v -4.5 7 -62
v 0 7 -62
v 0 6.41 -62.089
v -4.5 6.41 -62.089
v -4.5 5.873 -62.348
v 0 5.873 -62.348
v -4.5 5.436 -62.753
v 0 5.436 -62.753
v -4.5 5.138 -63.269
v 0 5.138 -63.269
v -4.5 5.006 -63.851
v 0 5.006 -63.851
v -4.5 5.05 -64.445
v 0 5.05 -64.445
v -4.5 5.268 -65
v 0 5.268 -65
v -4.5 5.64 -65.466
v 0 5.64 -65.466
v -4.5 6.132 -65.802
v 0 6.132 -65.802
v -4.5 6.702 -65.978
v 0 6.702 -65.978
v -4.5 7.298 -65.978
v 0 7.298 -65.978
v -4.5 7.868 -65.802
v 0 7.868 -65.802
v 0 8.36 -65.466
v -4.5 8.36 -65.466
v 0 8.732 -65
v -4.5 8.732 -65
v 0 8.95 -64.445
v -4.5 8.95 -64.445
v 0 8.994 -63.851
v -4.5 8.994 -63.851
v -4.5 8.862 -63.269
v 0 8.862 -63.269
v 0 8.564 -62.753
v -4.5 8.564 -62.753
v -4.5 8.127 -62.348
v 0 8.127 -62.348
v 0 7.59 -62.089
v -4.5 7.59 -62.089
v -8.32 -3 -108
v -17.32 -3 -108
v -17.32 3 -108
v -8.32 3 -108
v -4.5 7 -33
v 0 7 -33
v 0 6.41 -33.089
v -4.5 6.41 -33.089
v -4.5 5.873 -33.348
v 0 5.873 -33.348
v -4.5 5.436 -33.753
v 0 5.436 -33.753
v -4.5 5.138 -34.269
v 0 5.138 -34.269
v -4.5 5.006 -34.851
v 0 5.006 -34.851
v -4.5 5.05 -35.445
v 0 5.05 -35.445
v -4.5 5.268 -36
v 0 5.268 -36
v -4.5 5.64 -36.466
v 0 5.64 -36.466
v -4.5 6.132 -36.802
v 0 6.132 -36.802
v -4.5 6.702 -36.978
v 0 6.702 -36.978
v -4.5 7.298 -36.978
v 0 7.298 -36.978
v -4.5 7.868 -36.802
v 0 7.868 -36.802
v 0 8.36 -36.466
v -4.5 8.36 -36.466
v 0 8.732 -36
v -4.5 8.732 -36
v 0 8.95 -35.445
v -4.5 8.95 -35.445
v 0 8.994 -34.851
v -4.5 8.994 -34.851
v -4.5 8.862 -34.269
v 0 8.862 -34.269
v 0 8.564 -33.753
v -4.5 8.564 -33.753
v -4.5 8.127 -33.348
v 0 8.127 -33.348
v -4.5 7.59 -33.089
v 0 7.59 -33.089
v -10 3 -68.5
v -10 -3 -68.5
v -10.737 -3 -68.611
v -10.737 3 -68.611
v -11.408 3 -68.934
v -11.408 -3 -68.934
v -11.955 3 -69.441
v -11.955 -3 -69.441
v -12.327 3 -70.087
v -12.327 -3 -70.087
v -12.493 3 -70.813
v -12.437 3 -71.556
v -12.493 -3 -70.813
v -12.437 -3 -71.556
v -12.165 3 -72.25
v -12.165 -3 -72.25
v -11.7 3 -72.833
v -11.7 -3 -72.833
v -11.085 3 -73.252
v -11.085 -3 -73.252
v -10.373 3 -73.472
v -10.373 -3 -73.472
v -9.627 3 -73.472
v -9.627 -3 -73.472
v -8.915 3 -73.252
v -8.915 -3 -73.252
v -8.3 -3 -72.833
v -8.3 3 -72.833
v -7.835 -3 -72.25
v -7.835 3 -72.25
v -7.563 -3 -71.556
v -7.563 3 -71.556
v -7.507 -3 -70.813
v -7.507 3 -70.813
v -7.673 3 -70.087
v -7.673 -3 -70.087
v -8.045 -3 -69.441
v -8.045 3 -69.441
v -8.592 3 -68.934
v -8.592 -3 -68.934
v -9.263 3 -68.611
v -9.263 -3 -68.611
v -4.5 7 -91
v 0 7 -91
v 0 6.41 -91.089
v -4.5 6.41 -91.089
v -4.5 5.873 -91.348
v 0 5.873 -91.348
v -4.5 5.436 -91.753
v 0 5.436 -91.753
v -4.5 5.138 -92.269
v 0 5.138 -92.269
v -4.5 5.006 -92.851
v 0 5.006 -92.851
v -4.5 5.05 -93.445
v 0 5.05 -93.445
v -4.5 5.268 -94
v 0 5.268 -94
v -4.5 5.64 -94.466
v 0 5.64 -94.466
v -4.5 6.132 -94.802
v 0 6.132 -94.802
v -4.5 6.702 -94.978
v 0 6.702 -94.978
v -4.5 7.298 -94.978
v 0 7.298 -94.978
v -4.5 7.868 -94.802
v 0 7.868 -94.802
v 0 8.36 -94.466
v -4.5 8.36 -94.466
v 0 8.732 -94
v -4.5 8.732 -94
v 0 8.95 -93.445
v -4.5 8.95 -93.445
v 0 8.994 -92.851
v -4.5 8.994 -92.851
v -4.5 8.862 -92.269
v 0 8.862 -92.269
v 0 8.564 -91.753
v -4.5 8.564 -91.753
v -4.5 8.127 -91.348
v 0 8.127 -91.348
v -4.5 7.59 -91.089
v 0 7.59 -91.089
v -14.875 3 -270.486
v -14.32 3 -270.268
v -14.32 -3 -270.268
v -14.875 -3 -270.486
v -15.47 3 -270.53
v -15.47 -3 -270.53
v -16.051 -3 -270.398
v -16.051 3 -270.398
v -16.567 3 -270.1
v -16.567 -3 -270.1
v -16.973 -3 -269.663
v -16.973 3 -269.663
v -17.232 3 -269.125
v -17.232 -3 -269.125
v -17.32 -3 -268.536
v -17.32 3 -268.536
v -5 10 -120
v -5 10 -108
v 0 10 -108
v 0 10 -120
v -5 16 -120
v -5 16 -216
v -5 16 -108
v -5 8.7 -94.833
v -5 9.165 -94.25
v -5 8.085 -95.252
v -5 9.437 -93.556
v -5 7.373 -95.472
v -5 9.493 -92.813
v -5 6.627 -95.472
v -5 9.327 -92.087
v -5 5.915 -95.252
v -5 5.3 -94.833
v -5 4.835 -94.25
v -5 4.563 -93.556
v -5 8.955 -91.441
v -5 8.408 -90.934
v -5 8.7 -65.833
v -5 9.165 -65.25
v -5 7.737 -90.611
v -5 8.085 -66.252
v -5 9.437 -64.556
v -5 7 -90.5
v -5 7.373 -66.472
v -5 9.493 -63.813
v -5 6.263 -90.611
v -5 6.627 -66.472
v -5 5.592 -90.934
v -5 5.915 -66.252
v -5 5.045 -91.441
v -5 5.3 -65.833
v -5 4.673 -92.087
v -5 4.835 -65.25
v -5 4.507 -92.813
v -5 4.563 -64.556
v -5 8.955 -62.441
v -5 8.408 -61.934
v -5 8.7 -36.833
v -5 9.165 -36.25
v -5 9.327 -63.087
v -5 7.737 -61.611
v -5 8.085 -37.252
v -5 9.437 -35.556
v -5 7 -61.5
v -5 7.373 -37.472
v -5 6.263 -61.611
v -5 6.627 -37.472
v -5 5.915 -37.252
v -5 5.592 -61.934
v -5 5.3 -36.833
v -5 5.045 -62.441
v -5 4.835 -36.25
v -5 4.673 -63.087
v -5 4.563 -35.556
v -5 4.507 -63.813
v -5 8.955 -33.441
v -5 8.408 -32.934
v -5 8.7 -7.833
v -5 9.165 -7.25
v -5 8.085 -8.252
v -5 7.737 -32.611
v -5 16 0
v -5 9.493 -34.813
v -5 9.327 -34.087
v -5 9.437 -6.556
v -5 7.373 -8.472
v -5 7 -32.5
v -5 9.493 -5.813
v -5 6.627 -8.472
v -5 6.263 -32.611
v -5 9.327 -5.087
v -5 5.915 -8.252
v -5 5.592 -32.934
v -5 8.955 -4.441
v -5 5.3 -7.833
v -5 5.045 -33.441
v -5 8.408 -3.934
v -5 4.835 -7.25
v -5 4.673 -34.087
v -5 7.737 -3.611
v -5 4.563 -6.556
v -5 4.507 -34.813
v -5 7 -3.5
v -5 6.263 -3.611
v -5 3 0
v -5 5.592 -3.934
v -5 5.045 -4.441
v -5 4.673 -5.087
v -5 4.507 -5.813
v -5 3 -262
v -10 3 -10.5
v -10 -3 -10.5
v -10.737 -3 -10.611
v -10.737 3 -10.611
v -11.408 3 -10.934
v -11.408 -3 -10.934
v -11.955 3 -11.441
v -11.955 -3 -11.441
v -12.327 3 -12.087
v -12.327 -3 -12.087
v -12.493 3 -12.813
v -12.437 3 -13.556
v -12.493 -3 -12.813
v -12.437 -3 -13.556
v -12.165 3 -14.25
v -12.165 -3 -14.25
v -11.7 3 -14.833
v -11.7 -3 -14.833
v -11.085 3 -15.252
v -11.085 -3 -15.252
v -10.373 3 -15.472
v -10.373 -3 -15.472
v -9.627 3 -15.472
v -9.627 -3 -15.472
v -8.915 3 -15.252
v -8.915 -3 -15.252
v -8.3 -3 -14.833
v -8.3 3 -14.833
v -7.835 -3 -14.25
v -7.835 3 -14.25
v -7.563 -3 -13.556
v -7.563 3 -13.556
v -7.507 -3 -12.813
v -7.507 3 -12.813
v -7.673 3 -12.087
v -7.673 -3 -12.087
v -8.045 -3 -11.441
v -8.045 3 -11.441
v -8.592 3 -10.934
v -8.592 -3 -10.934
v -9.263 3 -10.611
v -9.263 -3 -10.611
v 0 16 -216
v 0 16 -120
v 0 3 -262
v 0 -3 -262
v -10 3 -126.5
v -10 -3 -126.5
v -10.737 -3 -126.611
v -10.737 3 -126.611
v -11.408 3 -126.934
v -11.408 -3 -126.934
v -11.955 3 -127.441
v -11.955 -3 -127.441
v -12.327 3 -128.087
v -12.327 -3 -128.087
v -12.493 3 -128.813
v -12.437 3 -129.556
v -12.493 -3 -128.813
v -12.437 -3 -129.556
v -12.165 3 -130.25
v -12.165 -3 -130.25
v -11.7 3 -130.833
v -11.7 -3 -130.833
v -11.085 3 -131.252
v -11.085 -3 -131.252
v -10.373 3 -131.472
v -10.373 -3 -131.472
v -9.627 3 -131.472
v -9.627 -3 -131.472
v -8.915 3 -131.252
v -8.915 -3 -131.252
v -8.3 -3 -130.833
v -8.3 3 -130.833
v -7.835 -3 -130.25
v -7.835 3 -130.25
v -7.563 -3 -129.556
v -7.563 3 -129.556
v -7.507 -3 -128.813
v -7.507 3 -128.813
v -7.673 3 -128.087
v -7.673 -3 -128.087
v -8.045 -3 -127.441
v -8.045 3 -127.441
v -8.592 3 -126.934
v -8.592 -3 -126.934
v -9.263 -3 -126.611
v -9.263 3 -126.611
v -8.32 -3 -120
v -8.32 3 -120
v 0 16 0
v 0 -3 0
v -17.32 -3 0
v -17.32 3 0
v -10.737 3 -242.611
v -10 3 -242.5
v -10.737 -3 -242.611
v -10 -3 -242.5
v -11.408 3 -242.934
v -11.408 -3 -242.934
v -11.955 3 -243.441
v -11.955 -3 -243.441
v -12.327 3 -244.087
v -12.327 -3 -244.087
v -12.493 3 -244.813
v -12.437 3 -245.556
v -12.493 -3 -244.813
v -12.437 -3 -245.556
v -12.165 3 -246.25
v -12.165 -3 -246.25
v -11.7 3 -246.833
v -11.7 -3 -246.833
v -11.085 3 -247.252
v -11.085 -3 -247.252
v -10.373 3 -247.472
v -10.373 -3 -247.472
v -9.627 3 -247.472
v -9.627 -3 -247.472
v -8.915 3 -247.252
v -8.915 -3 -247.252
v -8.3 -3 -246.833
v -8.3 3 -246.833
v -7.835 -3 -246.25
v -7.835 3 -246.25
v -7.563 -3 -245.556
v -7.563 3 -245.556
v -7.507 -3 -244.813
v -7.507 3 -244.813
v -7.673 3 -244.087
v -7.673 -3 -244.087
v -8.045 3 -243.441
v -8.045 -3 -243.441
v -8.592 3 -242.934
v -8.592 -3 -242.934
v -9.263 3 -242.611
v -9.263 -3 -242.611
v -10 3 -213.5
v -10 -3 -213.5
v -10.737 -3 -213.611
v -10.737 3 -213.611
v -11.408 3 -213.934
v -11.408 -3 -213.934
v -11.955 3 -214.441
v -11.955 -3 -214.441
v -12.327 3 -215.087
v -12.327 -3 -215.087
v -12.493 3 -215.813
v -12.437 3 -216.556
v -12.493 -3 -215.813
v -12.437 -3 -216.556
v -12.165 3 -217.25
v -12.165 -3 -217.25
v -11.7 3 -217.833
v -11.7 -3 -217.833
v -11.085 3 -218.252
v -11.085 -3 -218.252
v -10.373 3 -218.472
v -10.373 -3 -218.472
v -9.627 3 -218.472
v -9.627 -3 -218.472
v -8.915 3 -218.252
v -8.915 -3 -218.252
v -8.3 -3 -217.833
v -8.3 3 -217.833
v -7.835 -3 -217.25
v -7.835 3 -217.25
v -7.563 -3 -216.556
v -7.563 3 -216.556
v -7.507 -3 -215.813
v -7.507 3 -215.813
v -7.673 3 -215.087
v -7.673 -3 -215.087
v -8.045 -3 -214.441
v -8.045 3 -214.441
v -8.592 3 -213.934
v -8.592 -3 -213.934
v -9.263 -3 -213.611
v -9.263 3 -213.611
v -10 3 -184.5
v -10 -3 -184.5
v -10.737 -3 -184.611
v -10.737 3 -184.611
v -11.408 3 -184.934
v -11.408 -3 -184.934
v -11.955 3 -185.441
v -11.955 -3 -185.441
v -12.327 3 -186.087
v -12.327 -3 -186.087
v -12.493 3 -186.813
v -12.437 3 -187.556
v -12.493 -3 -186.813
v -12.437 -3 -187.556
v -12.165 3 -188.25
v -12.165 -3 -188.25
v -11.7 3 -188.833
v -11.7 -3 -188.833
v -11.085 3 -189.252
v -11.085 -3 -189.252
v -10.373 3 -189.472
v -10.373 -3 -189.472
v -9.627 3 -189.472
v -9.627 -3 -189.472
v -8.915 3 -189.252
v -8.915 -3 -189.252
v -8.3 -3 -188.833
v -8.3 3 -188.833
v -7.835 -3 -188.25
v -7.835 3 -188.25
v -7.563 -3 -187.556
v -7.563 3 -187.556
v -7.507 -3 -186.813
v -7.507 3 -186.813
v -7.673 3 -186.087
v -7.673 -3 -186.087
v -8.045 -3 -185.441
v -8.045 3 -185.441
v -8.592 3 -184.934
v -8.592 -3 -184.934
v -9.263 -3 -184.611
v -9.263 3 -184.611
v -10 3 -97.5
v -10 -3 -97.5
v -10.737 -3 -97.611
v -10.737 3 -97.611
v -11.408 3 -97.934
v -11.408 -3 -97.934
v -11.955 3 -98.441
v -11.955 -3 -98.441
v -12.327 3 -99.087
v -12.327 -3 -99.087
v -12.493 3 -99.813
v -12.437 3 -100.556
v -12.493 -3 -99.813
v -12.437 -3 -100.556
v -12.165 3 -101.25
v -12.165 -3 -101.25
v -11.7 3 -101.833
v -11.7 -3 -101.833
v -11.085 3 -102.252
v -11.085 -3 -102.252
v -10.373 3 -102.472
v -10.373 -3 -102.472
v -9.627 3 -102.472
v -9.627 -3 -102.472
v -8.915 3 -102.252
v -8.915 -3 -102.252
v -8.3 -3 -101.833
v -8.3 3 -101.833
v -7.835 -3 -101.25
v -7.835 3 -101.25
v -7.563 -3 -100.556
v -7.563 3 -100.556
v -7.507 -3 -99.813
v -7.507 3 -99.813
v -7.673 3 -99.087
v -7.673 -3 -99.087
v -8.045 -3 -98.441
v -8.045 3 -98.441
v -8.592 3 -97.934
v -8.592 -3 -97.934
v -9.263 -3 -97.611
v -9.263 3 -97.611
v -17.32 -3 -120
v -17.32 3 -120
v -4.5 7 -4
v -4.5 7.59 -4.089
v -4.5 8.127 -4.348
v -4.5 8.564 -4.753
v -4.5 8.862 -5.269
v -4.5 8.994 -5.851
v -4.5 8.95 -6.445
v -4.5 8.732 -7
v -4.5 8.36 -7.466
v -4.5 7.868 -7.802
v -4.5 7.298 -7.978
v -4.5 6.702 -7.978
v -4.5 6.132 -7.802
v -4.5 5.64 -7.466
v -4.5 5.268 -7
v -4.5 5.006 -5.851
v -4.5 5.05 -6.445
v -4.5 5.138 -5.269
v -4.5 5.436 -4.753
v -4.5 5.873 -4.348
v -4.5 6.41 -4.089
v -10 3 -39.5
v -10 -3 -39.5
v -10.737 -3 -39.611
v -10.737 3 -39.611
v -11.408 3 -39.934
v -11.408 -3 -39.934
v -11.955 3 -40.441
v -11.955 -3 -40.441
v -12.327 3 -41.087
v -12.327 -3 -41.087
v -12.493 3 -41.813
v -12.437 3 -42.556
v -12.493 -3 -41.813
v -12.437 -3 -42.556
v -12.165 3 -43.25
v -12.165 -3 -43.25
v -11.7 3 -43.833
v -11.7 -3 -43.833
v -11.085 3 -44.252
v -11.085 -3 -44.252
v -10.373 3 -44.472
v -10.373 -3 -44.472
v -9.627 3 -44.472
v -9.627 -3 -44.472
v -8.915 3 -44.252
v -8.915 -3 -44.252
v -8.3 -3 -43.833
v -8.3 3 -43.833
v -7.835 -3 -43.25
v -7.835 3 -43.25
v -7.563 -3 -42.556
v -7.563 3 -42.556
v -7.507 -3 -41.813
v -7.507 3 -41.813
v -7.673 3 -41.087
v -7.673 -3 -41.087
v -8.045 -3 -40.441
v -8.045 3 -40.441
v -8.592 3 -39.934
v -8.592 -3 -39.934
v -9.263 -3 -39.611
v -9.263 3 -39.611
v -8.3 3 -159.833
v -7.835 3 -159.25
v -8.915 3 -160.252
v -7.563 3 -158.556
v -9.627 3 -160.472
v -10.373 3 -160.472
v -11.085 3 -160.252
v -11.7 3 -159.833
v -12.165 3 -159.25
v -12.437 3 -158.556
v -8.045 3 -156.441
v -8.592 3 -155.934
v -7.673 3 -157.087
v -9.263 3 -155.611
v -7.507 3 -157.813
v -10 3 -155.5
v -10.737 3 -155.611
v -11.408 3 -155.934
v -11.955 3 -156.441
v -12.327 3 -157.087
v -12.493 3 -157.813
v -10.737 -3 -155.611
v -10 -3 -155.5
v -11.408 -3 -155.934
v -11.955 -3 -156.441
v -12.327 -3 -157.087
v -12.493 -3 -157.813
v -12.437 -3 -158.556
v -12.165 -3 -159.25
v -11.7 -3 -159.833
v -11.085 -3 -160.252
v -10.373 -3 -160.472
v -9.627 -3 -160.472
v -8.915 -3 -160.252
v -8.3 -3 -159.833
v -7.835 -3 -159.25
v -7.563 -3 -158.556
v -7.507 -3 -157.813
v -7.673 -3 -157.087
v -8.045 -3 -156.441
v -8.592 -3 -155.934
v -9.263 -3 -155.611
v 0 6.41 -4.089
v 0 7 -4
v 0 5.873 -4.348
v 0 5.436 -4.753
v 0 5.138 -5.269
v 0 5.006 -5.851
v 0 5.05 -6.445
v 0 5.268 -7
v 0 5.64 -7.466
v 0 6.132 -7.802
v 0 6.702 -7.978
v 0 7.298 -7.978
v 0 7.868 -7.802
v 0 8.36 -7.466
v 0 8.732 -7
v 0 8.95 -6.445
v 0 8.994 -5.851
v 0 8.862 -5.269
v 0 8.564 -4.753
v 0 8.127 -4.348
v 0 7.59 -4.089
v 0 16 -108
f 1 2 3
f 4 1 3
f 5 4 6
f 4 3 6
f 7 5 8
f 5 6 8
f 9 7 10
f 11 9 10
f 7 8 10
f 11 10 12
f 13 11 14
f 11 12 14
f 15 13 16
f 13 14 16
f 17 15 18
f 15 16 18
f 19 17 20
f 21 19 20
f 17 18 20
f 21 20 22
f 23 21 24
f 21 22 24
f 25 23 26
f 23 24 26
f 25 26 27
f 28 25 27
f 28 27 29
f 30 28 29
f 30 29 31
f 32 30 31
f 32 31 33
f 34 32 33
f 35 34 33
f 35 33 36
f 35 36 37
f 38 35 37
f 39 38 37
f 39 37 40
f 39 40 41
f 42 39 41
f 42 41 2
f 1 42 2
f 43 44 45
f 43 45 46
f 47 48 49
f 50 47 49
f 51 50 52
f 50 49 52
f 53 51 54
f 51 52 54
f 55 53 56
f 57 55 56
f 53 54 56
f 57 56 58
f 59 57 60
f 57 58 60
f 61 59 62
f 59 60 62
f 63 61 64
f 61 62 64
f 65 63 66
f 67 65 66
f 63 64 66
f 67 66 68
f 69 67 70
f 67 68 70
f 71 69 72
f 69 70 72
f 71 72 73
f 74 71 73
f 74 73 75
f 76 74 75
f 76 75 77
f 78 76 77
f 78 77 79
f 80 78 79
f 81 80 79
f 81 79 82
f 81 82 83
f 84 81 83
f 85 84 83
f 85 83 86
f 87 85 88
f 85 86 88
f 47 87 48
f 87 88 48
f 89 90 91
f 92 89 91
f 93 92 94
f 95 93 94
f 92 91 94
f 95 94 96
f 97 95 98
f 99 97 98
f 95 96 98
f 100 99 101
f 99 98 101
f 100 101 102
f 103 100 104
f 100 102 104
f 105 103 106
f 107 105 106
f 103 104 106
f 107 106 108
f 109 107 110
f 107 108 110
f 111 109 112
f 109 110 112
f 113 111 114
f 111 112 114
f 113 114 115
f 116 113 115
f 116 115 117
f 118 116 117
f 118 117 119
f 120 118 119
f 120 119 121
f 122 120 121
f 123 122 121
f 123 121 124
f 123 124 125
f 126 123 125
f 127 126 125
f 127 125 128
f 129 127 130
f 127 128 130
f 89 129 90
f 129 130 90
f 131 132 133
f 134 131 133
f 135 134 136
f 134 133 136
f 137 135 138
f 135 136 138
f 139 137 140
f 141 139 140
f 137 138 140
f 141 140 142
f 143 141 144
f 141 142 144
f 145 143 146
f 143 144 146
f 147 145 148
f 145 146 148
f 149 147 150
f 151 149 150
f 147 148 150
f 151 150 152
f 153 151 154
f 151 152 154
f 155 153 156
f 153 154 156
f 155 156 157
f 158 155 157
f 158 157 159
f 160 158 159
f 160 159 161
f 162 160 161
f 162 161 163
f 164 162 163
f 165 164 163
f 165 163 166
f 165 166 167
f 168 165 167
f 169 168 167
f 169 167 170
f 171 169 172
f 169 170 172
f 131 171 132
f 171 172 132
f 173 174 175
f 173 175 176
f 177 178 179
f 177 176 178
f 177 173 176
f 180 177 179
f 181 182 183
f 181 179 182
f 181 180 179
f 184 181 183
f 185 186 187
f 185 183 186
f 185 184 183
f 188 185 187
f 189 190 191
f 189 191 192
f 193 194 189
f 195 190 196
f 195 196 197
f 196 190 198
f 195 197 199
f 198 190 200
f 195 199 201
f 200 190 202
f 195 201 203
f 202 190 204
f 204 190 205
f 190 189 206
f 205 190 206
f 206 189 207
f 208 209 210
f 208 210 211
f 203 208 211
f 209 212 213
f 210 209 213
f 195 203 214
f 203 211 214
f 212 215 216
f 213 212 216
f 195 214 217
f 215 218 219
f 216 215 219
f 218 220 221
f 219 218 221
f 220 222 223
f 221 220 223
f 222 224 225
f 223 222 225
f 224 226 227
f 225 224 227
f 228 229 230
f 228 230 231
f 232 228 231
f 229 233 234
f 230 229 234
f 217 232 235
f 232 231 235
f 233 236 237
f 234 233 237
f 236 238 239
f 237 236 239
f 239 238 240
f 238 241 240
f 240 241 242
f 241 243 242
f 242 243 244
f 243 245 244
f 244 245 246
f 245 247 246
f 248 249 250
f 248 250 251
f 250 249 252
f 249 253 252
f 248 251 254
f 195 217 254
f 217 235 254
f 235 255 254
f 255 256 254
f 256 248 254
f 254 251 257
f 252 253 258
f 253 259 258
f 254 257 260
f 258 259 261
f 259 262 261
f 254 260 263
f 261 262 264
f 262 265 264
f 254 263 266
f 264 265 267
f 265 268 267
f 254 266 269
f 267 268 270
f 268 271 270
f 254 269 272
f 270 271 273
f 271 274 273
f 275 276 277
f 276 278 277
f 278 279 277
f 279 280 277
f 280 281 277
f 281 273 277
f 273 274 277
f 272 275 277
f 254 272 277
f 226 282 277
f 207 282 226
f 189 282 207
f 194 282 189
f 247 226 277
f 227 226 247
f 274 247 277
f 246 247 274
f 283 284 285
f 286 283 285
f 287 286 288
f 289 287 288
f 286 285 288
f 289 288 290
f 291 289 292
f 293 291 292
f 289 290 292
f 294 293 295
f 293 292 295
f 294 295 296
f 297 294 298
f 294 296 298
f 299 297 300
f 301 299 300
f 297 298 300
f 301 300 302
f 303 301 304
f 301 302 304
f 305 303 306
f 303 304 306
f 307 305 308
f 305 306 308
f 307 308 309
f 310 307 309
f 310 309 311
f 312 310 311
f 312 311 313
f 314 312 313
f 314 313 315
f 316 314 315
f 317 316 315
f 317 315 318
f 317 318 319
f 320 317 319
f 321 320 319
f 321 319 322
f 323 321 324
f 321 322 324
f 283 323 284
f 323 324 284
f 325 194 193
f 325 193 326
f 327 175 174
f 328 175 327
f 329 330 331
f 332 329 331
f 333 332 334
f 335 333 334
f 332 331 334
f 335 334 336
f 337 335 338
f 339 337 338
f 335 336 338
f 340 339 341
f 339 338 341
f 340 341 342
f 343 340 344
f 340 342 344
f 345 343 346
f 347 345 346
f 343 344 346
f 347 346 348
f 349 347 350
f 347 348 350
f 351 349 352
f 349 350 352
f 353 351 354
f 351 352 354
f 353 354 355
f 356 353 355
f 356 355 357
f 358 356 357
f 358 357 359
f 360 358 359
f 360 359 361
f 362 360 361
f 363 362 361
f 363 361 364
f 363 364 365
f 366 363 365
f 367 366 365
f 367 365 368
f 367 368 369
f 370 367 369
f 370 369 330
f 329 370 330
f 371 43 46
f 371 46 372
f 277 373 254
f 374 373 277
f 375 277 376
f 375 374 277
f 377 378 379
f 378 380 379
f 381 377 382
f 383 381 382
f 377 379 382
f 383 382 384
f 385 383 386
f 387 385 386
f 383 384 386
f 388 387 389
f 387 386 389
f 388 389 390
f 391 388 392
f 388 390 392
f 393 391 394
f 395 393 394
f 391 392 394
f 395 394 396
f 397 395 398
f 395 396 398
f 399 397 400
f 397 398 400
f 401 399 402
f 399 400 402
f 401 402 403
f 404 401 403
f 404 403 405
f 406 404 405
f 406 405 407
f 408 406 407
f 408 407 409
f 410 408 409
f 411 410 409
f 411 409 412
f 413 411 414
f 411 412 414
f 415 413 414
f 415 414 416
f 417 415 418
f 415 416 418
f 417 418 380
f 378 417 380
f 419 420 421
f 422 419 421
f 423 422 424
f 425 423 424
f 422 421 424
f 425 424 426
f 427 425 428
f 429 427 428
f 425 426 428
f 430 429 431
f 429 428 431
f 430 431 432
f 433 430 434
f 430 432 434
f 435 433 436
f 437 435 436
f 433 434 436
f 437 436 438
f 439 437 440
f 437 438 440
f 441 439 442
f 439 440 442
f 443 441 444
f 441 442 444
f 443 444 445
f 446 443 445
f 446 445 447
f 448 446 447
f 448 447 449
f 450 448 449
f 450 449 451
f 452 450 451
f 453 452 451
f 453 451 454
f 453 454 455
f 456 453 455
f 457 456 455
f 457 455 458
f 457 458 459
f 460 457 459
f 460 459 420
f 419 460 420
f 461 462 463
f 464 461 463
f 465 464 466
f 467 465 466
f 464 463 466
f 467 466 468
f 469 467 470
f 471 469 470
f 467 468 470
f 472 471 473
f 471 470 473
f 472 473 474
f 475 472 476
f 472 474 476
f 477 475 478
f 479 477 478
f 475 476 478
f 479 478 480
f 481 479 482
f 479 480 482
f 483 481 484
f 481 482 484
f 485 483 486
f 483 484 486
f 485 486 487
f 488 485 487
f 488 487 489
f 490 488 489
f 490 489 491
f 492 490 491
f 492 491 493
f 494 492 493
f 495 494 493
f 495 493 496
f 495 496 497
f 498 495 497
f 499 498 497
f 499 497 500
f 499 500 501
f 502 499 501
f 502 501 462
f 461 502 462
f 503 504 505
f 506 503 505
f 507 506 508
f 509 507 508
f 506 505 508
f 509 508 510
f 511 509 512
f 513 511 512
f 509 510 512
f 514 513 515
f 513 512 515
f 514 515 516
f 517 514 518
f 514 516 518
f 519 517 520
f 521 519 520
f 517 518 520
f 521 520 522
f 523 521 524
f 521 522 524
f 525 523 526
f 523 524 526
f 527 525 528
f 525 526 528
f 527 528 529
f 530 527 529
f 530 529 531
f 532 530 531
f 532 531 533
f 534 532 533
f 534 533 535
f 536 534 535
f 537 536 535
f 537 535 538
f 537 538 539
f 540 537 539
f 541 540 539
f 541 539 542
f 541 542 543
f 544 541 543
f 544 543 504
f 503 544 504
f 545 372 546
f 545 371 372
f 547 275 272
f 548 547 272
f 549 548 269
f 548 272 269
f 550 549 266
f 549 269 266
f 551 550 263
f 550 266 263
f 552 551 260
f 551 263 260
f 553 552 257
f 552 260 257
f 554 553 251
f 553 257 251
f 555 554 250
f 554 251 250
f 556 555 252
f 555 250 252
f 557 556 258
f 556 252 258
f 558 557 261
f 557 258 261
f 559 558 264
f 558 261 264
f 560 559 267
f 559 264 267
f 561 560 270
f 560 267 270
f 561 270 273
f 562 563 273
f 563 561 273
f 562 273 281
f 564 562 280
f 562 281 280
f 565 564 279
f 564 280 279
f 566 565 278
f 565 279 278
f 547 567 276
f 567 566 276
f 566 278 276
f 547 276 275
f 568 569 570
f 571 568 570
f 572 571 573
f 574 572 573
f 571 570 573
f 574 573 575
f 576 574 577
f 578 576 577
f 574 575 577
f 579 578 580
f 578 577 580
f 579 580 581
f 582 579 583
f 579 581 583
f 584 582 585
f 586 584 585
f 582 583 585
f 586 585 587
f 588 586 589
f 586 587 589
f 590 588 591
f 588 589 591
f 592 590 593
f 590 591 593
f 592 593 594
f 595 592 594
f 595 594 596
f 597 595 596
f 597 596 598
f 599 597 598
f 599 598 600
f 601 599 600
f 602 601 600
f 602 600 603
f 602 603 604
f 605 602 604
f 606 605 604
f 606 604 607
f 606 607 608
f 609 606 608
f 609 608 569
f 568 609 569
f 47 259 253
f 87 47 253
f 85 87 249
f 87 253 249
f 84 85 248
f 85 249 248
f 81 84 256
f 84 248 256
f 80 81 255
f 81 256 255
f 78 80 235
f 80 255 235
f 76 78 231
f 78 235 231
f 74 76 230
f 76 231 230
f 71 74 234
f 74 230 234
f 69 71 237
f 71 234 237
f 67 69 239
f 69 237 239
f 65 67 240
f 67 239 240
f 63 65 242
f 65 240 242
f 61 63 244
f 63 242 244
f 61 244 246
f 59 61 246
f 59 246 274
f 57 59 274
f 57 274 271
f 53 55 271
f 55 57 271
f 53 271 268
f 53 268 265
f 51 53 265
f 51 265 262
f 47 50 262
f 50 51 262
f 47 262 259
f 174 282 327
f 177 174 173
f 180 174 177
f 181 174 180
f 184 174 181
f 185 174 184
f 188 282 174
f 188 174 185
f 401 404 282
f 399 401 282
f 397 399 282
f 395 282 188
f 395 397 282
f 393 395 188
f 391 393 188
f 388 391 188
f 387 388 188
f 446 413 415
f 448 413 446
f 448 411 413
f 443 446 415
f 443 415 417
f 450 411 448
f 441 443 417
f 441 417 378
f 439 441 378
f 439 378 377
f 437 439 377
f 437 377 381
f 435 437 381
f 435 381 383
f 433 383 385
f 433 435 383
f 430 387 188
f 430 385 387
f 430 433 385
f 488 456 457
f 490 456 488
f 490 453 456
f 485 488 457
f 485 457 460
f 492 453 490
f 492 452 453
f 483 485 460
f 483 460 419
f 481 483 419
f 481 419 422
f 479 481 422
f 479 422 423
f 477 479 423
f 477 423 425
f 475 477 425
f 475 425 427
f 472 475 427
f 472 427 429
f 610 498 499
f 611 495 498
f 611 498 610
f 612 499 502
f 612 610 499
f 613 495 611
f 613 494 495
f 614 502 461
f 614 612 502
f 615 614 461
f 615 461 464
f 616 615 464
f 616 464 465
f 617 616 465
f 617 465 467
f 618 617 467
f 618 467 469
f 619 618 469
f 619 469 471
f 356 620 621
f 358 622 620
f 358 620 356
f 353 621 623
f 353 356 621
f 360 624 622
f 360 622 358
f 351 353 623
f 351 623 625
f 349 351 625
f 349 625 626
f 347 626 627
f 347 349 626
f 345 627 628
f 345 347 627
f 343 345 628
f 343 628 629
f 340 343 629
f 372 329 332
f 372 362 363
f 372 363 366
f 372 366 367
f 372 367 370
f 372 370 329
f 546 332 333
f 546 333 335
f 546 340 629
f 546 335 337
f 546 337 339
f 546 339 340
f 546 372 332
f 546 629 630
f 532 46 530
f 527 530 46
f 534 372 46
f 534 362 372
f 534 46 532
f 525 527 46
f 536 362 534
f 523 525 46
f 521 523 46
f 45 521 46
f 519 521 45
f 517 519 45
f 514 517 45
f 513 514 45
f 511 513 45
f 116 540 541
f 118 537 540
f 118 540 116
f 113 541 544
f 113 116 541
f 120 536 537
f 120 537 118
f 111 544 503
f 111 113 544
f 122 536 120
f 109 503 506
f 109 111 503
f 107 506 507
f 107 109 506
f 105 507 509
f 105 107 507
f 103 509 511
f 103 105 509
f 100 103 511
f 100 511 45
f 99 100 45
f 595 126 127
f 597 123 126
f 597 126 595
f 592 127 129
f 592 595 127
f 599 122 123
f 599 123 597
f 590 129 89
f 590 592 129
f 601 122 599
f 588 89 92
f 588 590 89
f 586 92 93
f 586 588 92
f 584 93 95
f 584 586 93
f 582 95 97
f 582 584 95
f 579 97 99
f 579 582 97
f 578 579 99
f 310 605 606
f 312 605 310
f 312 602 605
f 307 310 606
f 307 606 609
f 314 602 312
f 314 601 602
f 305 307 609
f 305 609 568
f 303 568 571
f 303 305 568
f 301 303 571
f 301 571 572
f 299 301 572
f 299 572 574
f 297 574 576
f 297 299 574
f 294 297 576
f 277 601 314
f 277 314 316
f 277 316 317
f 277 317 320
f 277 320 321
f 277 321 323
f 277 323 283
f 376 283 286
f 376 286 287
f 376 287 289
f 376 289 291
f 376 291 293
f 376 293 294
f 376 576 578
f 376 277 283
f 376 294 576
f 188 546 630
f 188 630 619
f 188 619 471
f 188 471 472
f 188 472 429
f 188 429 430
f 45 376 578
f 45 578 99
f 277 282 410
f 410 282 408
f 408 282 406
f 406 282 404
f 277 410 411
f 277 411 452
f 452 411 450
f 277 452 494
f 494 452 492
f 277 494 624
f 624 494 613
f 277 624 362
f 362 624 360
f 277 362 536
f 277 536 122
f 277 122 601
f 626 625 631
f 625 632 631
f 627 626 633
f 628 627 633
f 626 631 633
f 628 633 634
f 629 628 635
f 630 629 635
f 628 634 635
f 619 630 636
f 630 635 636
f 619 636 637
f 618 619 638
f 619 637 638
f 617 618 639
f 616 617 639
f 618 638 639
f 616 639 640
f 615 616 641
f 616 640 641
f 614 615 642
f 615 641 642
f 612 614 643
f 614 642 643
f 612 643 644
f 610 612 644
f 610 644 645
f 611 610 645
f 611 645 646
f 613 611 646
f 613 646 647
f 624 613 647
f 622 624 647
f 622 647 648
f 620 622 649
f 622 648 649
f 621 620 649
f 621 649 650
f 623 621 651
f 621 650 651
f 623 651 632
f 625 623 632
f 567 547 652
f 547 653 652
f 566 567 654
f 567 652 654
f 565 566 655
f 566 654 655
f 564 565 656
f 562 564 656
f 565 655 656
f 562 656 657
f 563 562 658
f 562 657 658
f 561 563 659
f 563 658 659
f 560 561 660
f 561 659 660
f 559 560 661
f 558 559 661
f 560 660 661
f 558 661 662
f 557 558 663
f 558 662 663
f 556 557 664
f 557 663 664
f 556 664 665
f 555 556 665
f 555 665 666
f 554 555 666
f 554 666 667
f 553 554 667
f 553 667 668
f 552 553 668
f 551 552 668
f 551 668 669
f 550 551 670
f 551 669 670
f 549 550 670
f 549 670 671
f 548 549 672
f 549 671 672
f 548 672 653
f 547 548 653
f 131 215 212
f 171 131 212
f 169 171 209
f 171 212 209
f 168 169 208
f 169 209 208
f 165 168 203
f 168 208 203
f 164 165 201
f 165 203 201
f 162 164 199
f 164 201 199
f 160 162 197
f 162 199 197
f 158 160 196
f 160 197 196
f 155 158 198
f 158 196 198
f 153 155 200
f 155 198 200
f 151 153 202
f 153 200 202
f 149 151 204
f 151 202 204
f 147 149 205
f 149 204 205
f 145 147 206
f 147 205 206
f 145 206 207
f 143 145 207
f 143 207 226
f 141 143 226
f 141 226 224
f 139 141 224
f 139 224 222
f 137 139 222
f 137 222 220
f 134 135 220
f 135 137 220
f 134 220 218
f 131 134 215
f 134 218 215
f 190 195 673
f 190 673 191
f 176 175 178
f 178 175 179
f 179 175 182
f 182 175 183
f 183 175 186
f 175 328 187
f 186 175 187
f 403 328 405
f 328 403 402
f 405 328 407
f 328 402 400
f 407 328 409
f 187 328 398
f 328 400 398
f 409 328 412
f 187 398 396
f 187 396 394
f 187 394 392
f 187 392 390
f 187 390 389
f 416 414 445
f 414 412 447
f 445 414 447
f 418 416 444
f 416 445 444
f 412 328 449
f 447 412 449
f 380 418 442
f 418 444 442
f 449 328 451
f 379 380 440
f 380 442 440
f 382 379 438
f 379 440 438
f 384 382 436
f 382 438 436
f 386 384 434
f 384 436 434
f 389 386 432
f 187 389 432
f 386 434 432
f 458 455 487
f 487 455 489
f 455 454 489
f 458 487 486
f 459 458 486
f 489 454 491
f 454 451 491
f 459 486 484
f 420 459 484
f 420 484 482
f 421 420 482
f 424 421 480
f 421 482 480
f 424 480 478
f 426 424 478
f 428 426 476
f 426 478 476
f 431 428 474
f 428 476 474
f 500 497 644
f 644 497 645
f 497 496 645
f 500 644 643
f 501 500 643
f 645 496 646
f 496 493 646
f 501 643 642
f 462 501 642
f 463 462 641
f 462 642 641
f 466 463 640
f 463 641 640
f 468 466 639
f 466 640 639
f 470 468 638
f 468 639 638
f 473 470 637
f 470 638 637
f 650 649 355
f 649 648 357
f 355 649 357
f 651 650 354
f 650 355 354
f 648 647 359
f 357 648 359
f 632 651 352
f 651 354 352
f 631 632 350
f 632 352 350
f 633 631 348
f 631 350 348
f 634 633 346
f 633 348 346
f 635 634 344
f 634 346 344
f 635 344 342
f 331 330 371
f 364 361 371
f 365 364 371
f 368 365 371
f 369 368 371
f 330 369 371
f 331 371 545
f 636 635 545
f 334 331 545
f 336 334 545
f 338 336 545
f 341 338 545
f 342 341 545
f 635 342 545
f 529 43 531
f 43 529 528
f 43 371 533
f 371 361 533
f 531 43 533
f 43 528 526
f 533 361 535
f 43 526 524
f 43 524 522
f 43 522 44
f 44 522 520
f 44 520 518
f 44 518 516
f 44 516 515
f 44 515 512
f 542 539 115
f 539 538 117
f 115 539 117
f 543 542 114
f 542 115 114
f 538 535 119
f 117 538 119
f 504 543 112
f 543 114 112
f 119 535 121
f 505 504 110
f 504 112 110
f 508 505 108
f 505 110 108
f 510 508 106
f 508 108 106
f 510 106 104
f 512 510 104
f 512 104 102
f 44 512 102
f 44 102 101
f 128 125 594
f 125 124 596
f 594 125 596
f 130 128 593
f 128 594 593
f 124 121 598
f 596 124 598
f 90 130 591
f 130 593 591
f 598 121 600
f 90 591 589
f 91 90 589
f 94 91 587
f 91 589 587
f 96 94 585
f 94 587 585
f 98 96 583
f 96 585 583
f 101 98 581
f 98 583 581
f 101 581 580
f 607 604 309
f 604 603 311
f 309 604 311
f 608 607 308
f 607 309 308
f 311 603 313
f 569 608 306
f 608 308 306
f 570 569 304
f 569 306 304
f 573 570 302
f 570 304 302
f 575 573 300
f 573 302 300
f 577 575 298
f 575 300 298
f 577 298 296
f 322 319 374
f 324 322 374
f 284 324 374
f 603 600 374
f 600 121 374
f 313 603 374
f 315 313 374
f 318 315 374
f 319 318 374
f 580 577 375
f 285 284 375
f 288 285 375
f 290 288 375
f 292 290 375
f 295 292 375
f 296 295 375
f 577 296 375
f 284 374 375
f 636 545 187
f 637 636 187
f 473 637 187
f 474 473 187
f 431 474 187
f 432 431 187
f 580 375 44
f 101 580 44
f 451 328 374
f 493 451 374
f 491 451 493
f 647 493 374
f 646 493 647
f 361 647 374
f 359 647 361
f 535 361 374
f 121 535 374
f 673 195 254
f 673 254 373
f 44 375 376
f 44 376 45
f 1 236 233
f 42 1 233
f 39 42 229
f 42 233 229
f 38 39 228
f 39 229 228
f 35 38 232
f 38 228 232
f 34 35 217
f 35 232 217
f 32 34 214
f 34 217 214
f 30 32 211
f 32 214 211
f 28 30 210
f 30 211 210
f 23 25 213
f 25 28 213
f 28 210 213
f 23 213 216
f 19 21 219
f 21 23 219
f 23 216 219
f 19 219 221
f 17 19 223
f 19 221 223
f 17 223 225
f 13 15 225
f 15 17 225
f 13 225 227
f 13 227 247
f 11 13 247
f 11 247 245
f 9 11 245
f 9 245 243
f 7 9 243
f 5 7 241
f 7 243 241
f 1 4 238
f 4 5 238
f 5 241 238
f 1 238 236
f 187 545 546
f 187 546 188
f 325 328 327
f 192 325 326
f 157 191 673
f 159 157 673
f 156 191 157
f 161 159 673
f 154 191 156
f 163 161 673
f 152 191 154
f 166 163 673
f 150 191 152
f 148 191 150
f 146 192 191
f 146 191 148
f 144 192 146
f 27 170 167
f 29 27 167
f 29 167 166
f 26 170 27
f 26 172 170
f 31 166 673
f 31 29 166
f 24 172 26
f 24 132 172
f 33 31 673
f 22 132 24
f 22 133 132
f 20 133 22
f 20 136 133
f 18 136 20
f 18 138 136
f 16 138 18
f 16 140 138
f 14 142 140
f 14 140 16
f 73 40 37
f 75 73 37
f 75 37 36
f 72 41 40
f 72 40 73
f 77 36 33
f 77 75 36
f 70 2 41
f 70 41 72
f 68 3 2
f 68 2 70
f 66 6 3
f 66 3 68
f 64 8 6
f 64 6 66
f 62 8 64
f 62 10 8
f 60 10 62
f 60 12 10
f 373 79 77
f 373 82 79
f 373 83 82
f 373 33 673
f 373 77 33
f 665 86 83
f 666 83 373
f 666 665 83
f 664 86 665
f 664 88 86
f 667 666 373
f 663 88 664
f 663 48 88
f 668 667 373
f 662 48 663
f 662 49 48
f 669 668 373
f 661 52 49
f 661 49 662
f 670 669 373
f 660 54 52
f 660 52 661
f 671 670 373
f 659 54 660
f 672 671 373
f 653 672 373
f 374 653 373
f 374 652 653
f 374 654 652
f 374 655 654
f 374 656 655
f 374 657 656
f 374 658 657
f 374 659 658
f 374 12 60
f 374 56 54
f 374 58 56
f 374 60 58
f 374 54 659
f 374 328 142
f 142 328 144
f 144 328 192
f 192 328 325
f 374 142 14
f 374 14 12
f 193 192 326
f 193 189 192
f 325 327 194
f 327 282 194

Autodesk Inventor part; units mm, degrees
ref_plane "YZ Plane" through (0, 0, 0) normal (1, 0, 0) x (0, 1, 0)
ref_plane "XZ Plane" through (0, 0, 0) normal (0, 1, 0) x (-1, 0, 0)
ref_plane "XY Plane" through (0, 0, 0) normal (0, 0, 1) x (1, 0, 0)
sketch "Sketch1" plane through (0, 0, 0) normal (0, 1, 0) x (-1, 0, 0)
  line L0 (0, 0) -> (17.3205, 0)
  line L1 (0, -262) -> (0, 0)
  line L2 (17.3205, -272) -> (0, -262)
  line L3 (17.3205, -108) -> (8.3205, -108)
  line L4 (8.3205, -108) -> (8.3205, -120)
  line L5 (8.3205, -120) -> (17.3205, -120)
  line L6 (17.3205, 0) -> (17.3205, -108)
  line L7 (17.3205, -120) -> (17.3205, -272)
  dimension "d0" = 272
  dimension "d1" = 60
  dimension "d2" = 12
  dimension "d3" = 9
  dimension "d4" = 108
  dimension "d6" = 262
extrude "Extrusion1" add sketch "Sketch1" along normal mid plane 6
sketch "Sketch2" plane through (0, 3, 0) normal (0, 1, 0) x (1, 0, 0)
  line L0 (0, 0) -> (0, 262) projected
  point P0 (-10, 13)
  point P1 (-10, 42)
  point P2 (-10, 71)
  point P3 (-10, 100)
  point P4 (-10, 129)
  point P5 (-10, 158)
  point P6 (-10, 187)
  point P7 (-10, 216)
  point P8 (-10, 245)
  dimension "d9" = 10
  dimension "d10" = 17
  dimension "d11" = 13
  dimension "d12" = 29
  dimension "d13" = 29
  dimension "d14" = 29
  dimension "d15" = 29
  dimension "d16" = 29
  dimension "d17" = 29
  dimension "d18" = 29
  dimension "d19" = 29
hole "Hole1" at (-10, 3, -13) at (-10, 3, -42) at (-10, 3, -71) at (-10, 3, -100) at (-10, 3, -129) at (-10, 3, -158) at (-10, 3, -187) at (-10, 3, -216) at (-10, 3, -245) direction (0, -1, 0) diameter 5 depth 6
sketch "Sketch3" plane through (0, 3, 0) normal (0, 1, 0) x (1, 0, 0)
  line L0 (0, 0) -> (-17.3205, 0) projected
  line L1 (0, 262) -> (0, 0) projected
  line L2 (-5, 0) -> (0, 0)
  line L3 (0, 0) -> (0, 262)
  line L4 (0, 262) -> (-5, 262)
  line L5 (-5, 262) -> (-5, 0)
  dimension "d27" = 5
extrude "Extrusion2" add sketch "Sketch3" along normal blind 13
sketch "Sketch4" plane through (-5, 3, -262) normal (-1, 0, 0) x (0, 0, 1)
  line L0 (0, 13) -> (262, 13) projected
  line L1 (154, 13) -> (154, 7)
  line L2 (154, 7) -> (142, 7)
  line L3 (142, 7) -> (142, 13)
  line L4 (262, 0) -> (262, 13) projected
  point P0 (262, -3)
  dimension "d30" = 12
  dimension "d31" = 6
  dimension "d32" = 108
extrude "Extrusion3" cut sketch "Sketch4" against normal blind 5
sketch "Sketch5" plane through (-5, 3, -262) normal (-1, 0, 0) x (0, 0, 1)
  line L0 (262, 0) -> (262, 13) projected
  line L1 (154, 13) -> (154, 7) projected
  line L2 (262, -6) -> (154, -6) projected
  point P0 (262, -3)
  point P1 (256, 4)
  point P2 (227, 4)
  point P3 (198, 4)
  point P4 (169, 4)
  point P5 (262, 6.5)
  dimension "d35" = 6
  dimension "d36" = 15
  dimension "d37" = 29
  dimension "d38" = 29
  dimension "d39" = 29
  dimension "d40" = 10
hole "Hole2" at (-5, 7, -6) at (-5, 7, -35) at (-5, 7, -64) at (-5, 7, -93) direction (1, 0, 0) diameter 4 depth 5 countersink diameter 5 countersink angle 90
sketch "Sketch6" plane through (-5, 3, -262) normal (-1, 0, 0) x (0, 0, 1)
  circle A0 centre (169, 4) radius 2.5 projected
  circle A1 centre (198, 4) radius 2.5 projected
  circle A2 centre (227, 4) radius 2.5 projected
  circle A3 centre (256, 4) radius 2.5 projected
  line L0 (154, 13) -> (154, 7) projected
  line L1 (154, 7) -> (142, 7) projected
  line L2 (142, 7) -> (142, 13) projected
  line L3 (0, 13) -> (142, 13) projected
  line L4 (0, 0) -> (0, 13) projected
  line L5 (262, 0) -> (0, 0) projected
  line L6 (262, 0) -> (262, 13) projected
  line L7 (154, 13) -> (262, 13) projected
  line L8 (0, 0) -> (46, 13)
  point P0 (262, -3)
  dimension "d48" = 96
extrude "Extrusion4" cut sketch "Sketch6" against normal up to surface (5 mm away) contours L4 L3 L8
fillet "Fillet1" radius 2 1 edges at (-17.3205, 0, -272)
equation "\"d13\" = d12"
equation "\"d14\" = d12"
equation "\"d15\" = d12"
equation "\"d16\" = d12"
equation "\"d17\" = d12"
equation "\"d18\" = d12"
equation "\"d38\" = d37"
properties part number "1013"
